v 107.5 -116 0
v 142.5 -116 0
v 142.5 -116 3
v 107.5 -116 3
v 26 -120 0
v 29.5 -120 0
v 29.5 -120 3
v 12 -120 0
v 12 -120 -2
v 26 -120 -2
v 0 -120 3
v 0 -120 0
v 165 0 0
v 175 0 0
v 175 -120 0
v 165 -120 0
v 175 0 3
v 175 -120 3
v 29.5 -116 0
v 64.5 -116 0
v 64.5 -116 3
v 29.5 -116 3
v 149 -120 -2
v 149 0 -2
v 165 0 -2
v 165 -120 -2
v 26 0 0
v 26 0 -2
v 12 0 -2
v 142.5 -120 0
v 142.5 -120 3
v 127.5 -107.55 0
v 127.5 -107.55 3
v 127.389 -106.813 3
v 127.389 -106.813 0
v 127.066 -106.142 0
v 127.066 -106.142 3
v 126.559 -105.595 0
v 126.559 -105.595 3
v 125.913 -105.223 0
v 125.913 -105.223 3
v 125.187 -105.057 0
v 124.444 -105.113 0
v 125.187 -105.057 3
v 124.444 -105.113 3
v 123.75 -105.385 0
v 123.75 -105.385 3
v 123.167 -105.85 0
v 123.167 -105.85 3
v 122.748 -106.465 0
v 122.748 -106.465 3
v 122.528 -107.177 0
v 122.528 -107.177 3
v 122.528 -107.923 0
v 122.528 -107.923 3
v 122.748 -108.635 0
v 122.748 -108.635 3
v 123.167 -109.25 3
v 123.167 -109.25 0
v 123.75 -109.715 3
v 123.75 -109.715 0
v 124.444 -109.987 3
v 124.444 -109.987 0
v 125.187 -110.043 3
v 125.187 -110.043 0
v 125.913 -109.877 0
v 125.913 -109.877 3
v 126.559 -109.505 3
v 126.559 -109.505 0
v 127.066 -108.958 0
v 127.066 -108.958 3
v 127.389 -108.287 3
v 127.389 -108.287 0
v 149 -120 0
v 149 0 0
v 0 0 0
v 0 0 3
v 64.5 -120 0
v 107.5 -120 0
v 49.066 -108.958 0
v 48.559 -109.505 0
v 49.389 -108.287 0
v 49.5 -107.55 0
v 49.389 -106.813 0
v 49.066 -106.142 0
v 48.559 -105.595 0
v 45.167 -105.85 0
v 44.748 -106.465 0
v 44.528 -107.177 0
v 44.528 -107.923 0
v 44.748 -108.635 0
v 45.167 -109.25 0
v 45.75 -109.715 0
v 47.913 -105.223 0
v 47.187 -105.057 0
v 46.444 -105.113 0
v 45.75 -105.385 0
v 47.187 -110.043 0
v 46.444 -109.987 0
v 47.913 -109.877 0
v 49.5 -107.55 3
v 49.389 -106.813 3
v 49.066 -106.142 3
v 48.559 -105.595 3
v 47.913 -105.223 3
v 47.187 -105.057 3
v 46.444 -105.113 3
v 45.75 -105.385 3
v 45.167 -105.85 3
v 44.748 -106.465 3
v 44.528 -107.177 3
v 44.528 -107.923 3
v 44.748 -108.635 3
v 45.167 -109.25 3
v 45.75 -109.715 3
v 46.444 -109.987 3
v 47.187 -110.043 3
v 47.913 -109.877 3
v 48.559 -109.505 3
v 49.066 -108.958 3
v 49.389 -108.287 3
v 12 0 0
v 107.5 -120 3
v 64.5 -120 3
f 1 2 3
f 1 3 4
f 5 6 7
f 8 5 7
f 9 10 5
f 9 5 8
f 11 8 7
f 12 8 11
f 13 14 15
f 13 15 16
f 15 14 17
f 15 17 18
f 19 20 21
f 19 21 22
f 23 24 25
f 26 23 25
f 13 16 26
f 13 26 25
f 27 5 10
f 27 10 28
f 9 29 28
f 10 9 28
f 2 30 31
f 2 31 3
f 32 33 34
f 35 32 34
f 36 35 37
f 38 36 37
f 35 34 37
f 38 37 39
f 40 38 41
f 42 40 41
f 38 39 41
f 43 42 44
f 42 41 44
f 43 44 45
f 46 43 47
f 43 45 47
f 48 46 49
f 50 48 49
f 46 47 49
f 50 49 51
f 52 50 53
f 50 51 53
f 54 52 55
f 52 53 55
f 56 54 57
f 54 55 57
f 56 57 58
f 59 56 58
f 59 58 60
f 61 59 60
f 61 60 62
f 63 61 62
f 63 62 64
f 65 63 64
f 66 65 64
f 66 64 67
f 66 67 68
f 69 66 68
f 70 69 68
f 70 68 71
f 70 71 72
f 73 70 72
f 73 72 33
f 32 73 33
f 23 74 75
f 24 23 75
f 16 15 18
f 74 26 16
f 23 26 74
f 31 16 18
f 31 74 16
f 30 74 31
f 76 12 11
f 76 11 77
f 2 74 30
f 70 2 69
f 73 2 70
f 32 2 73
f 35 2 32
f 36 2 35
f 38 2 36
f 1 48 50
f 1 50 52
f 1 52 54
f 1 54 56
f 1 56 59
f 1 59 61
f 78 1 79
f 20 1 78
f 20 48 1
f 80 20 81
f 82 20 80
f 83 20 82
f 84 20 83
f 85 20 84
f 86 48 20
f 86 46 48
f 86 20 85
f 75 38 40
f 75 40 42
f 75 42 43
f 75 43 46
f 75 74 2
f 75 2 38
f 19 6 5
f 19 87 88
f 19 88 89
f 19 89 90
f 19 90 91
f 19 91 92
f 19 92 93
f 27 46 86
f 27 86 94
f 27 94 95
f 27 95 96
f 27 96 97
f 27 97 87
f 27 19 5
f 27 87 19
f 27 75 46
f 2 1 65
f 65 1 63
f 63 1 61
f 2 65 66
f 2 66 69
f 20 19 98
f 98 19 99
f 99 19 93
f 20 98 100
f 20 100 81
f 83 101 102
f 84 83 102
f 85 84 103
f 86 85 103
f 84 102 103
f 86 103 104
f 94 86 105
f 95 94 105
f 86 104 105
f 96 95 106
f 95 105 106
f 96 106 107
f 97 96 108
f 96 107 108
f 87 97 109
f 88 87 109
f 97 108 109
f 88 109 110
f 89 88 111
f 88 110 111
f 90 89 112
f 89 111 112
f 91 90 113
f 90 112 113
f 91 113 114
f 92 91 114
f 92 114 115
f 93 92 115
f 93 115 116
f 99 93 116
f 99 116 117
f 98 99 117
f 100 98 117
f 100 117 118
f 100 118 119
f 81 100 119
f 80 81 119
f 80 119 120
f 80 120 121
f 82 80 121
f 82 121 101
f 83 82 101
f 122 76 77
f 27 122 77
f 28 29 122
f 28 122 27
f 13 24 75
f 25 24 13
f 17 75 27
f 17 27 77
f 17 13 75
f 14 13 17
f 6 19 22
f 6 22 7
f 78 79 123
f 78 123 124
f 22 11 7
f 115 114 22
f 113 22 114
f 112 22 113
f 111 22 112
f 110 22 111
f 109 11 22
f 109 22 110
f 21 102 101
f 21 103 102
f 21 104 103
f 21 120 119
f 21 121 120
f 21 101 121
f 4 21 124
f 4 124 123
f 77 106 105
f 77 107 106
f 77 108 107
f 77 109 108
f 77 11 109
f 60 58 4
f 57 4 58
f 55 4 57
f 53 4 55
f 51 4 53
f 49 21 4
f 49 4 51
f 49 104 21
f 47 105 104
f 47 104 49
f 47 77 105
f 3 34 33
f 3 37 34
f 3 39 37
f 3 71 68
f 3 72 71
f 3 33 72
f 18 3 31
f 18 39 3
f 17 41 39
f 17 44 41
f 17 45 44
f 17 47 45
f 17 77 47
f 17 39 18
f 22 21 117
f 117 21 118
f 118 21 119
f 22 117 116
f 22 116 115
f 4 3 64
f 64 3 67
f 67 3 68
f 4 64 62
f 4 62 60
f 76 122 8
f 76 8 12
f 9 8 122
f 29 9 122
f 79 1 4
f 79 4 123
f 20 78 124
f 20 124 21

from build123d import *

# Parameters (mm, degrees)
BOSS_EXTRU_1_DEPTH      = 3
ESQUISSE3_W             = 14
ESQUISSE3_H             = 120
ESQUISSE3_W_2           = 16
BOSS_EXTRU_2_DEPTH      = 5
ESQUISSE4_R             = 2.5
ENL_V_MAT_EXTRU_1_DEPTH = 10


with BuildPart() as part:
    # Esquisse2 → Boss.-Extru.1 (new body)
    with BuildSketch(Plane.XY):
        Polygon((0, 0), (175, 0), (175, -120), (142.5, -120), (142.5, -116), (107.5, -116), (107.5, -120), (64.5, -120), (64.5, -116), (29.5, -116), (29.5, -120), (0, -120), align=None)
    extrude(amount=BOSS_EXTRU_1_DEPTH)

    # Esquisse3 → Boss.-Extru.2 (add)
    with BuildSketch(Plane.XY.offset(3)):
        with Locations((19, -60)):
            Rectangle(ESQUISSE3_W, ESQUISSE3_H)
        with Locations((157, -60)):
            Rectangle(ESQUISSE3_W_2, ESQUISSE3_H)
    extrude(amount=-BOSS_EXTRU_2_DEPTH)

    # Esquisse4 → Enlèv. mat.-Extru.1 (cut)
    with BuildSketch(Plane.XY.offset(3)):
        with Locations((47, -107.55)):
            Circle(ESQUISSE4_R)
        with Locations((125, -107.55)):
            Circle(ESQUISSE4_R)
    extrude(amount=-ENL_V_MAT_EXTRU_1_DEPTH, mode=Mode.SUBTRACT)


solid = part.part
